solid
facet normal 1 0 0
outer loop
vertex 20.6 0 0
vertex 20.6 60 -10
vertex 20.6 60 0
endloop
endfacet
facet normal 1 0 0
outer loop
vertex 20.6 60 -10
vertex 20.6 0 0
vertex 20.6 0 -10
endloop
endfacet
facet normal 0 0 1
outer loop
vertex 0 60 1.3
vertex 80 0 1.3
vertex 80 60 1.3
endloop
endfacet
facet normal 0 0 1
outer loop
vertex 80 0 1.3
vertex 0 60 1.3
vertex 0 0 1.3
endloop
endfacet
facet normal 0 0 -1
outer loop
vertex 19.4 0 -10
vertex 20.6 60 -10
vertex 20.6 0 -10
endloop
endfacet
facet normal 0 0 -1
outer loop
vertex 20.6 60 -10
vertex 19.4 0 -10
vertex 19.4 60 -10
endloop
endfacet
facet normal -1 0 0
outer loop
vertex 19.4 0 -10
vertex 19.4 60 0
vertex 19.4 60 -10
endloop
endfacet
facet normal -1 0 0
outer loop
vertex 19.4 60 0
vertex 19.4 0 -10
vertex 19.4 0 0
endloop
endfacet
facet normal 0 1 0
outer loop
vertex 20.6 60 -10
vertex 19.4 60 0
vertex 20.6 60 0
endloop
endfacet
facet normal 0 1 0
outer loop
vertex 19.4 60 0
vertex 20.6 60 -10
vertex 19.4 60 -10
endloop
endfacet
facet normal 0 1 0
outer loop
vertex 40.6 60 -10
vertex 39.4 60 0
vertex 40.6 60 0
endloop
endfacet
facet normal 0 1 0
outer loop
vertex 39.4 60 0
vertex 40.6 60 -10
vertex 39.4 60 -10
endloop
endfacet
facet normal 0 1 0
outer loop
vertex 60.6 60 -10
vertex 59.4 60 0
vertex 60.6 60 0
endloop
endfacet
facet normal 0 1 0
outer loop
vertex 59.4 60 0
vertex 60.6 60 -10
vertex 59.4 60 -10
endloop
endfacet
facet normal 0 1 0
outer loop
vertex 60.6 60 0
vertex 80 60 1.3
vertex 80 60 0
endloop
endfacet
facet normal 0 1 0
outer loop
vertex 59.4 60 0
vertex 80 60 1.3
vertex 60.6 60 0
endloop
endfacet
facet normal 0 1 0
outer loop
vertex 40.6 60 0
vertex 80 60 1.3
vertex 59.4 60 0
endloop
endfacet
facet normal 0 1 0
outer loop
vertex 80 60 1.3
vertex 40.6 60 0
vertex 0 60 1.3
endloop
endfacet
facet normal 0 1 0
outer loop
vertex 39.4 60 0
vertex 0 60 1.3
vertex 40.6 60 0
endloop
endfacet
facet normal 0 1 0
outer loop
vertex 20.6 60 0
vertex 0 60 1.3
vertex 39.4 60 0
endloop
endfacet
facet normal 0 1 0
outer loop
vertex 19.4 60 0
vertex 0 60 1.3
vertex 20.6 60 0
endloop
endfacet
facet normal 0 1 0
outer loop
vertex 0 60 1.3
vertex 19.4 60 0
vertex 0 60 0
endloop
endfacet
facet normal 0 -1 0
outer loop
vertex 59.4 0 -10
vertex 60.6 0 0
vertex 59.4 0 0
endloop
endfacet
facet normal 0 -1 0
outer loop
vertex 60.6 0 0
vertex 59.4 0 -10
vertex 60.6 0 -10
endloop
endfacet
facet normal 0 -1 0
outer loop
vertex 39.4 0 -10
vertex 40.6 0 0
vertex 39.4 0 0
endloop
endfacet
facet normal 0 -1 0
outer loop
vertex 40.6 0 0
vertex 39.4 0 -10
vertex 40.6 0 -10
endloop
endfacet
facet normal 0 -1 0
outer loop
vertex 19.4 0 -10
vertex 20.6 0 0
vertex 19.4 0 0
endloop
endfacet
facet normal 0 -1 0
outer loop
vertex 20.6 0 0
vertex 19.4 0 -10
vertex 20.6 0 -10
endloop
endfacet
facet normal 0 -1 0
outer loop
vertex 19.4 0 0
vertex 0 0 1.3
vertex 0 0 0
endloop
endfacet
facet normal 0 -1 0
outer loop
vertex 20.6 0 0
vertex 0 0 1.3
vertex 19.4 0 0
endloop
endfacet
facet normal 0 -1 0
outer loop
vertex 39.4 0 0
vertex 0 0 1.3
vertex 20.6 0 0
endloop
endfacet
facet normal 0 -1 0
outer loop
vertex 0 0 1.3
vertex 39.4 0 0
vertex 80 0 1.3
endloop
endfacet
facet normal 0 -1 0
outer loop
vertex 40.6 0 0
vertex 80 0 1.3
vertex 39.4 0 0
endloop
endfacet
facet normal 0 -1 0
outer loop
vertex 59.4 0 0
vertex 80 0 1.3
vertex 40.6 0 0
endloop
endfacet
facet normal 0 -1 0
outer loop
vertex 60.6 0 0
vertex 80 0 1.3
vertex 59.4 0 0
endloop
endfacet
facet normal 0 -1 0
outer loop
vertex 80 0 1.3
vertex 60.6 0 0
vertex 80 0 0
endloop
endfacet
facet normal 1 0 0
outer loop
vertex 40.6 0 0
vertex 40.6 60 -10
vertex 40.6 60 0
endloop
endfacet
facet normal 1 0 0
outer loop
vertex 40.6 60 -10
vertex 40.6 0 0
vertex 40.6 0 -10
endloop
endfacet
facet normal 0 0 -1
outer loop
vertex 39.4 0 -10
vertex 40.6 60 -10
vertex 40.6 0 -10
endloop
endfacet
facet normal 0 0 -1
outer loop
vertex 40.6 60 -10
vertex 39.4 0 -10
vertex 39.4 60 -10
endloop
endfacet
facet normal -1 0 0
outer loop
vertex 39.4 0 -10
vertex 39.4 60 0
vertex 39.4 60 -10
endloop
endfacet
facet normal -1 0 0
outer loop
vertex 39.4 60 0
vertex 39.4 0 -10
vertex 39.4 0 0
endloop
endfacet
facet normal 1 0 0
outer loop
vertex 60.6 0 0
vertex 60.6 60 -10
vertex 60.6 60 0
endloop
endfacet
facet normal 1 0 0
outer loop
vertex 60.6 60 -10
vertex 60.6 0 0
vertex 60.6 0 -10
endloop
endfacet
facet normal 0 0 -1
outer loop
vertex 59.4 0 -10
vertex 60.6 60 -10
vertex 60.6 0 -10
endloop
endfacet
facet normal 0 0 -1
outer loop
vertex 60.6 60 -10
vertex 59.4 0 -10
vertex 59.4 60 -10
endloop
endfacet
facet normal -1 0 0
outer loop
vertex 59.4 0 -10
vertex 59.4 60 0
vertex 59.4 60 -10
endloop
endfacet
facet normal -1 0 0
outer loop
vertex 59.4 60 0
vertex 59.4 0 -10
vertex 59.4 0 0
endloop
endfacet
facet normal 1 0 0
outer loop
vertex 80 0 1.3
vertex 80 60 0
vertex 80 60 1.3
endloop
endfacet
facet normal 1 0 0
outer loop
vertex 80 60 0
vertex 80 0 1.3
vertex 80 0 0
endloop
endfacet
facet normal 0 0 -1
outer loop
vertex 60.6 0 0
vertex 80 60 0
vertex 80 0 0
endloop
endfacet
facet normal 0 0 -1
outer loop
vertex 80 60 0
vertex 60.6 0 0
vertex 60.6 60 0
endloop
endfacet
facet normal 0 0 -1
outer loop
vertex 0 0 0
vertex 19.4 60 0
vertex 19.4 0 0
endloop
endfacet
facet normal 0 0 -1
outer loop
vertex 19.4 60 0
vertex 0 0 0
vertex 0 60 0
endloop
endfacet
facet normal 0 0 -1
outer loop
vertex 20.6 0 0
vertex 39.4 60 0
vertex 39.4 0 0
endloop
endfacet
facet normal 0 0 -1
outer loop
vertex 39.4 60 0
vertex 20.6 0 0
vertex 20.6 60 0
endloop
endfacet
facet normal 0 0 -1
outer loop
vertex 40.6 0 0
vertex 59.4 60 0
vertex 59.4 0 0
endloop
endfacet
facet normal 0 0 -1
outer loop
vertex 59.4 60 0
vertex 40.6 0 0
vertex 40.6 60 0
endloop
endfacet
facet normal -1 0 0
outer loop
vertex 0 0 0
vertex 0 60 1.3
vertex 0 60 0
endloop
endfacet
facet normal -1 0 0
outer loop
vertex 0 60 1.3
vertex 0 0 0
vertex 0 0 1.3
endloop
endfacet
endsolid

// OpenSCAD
$fn = 32;

// ----------------------------------------------------------------------
// Ribbed panel: 1.3 mm panel
// ----------------------------------------------------------------------

// --- parameters (mm) ---
panel_l = 80;             // panel length, X
panel_w = 60;             // panel width, Y
panel_t = 1.3;            // panel thickness, Z
rib_t = 1.2;              // rib thickness
rib_h = 10;               // rib height below the panel
ribs = 3;                 // number of ribs

total_h = panel_t + rib_h;  // overall height

union() {
  cube([panel_l, panel_w, panel_t]);
  for (i = [1 : ribs])
    translate([i * panel_l / (ribs + 1) - rib_t / 2, 0, -rib_h])
      cube([rib_t, panel_w, rib_h + panel_t]);
}
